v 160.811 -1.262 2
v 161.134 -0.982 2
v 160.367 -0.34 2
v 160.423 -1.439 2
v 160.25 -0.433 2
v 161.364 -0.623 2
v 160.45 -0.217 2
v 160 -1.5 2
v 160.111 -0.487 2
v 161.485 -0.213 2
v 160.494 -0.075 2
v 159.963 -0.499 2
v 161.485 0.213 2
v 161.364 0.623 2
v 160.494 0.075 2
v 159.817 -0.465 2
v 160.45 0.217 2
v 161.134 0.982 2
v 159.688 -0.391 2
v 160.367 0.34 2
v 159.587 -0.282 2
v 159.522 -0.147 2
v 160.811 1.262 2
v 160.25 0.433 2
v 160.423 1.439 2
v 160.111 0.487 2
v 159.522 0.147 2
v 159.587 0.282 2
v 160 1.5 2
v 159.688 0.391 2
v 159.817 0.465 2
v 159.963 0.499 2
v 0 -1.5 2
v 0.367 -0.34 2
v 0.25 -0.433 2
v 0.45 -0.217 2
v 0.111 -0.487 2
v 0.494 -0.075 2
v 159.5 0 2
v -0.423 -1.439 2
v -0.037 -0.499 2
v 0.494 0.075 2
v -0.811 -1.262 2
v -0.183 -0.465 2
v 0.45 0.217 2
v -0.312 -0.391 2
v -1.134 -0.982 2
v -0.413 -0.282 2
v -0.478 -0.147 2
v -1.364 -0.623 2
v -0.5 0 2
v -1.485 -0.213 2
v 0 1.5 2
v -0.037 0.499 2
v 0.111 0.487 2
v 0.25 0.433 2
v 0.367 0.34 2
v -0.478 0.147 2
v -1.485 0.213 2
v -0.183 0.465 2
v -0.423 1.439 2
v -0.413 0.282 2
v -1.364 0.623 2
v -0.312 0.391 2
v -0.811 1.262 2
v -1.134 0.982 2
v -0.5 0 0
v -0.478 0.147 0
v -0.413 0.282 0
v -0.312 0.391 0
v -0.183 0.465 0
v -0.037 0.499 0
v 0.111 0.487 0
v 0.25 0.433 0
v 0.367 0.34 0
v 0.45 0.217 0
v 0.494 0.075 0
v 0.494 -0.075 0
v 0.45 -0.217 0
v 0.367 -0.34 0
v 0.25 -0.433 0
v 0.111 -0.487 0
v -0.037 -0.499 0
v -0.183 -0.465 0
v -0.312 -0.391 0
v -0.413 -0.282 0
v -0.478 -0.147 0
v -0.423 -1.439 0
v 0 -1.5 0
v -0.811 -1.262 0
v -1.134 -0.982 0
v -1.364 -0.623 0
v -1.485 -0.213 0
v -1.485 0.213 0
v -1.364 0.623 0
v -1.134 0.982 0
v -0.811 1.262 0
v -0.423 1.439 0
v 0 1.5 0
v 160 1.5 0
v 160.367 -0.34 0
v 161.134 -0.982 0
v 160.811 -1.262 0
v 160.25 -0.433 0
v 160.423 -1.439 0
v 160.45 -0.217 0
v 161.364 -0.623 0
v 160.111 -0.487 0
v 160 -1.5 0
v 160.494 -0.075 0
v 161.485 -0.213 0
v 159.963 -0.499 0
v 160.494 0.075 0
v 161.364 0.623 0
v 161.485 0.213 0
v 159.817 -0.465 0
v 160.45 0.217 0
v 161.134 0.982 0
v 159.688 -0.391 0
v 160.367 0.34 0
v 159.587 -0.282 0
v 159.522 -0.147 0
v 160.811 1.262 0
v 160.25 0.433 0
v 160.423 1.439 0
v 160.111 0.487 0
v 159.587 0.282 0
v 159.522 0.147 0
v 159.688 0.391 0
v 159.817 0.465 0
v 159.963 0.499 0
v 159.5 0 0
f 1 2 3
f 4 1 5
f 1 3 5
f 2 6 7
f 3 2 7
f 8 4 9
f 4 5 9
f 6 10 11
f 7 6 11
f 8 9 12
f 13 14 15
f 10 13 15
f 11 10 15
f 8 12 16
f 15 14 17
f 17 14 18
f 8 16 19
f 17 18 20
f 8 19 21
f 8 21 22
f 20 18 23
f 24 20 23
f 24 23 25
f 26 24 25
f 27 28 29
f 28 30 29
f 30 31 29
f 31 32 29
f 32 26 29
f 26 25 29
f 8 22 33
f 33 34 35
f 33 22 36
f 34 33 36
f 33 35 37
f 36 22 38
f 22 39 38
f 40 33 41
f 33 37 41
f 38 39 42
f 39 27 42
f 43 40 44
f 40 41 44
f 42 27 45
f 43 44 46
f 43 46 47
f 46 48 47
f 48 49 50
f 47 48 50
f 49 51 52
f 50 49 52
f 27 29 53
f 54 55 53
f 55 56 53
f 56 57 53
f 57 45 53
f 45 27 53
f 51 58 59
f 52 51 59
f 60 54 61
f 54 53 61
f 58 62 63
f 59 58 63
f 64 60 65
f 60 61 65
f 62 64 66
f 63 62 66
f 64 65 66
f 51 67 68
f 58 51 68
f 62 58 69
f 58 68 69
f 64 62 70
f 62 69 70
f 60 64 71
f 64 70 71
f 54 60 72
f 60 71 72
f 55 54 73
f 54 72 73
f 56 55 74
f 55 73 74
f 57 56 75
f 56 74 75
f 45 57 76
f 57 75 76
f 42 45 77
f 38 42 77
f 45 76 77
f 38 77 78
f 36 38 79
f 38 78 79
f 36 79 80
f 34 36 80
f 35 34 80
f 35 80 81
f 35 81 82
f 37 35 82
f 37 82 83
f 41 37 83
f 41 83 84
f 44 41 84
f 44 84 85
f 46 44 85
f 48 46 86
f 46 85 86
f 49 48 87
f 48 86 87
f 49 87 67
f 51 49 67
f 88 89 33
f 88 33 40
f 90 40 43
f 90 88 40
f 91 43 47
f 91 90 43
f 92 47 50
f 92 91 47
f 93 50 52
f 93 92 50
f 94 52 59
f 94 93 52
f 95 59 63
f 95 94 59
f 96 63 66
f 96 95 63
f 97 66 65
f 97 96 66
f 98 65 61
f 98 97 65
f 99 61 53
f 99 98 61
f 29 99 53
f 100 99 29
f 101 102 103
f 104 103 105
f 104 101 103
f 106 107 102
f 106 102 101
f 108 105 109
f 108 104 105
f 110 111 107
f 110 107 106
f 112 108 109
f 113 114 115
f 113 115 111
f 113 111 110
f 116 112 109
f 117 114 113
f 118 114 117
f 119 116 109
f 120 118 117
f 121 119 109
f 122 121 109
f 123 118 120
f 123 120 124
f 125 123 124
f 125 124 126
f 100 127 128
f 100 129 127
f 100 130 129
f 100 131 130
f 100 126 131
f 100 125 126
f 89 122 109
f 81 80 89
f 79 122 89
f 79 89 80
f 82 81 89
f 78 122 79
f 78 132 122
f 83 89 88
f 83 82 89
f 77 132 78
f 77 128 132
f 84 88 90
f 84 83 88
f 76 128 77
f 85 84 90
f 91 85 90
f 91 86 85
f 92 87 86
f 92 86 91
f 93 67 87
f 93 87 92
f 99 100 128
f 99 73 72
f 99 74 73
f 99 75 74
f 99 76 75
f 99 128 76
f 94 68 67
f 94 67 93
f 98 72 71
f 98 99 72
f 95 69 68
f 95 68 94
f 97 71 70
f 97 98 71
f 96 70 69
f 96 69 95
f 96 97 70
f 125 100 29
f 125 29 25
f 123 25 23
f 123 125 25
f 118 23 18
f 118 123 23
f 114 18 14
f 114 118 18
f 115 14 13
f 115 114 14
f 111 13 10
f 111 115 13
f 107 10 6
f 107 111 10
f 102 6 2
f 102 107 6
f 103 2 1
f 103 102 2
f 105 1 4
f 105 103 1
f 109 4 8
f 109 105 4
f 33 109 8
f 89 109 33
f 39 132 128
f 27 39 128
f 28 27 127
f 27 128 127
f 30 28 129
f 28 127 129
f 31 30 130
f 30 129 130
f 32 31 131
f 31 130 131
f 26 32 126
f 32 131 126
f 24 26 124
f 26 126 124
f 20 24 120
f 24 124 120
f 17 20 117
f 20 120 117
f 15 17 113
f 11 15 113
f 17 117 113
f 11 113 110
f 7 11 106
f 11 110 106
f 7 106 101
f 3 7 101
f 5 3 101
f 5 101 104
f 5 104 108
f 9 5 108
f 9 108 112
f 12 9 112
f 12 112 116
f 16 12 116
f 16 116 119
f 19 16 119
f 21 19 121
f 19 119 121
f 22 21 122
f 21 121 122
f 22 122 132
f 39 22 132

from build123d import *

# Parameters (mm, degrees)
EXTRUDE_1_DEPTH     = 2
SKETCH_2_R          = 0.5
CUT_EXTRUDE_1_DEPTH = 2


with BuildPart() as part:
    # 草图1 → 凸台-拉伸1 (new body)
    with BuildSketch(Plane.XY):
        with BuildLine():
            Line((0, 1.5), (160, 1.5))
            ThreePointArc((160, 1.5), (161.5, 0), (160, -1.5))
            Line((160, -1.5), (0, -1.5))
            ThreePointArc((0, -1.5), (-1.5, 0), (0, 1.5))
        make_face()
    extrude(amount=EXTRUDE_1_DEPTH)

    # 草图2 → 切除-拉伸1 (cut)
    with BuildSketch(Plane(origin=(0, 0, 0), x_dir=(-1, 0, 0), z_dir=(0, 0, -1))):
        with Locations((-160, 0)):
            Circle(SKETCH_2_R)
        Circle(SKETCH_2_R)
    extrude(amount=-CUT_EXTRUDE_1_DEPTH, mode=Mode.SUBTRACT)


solid = part.part
